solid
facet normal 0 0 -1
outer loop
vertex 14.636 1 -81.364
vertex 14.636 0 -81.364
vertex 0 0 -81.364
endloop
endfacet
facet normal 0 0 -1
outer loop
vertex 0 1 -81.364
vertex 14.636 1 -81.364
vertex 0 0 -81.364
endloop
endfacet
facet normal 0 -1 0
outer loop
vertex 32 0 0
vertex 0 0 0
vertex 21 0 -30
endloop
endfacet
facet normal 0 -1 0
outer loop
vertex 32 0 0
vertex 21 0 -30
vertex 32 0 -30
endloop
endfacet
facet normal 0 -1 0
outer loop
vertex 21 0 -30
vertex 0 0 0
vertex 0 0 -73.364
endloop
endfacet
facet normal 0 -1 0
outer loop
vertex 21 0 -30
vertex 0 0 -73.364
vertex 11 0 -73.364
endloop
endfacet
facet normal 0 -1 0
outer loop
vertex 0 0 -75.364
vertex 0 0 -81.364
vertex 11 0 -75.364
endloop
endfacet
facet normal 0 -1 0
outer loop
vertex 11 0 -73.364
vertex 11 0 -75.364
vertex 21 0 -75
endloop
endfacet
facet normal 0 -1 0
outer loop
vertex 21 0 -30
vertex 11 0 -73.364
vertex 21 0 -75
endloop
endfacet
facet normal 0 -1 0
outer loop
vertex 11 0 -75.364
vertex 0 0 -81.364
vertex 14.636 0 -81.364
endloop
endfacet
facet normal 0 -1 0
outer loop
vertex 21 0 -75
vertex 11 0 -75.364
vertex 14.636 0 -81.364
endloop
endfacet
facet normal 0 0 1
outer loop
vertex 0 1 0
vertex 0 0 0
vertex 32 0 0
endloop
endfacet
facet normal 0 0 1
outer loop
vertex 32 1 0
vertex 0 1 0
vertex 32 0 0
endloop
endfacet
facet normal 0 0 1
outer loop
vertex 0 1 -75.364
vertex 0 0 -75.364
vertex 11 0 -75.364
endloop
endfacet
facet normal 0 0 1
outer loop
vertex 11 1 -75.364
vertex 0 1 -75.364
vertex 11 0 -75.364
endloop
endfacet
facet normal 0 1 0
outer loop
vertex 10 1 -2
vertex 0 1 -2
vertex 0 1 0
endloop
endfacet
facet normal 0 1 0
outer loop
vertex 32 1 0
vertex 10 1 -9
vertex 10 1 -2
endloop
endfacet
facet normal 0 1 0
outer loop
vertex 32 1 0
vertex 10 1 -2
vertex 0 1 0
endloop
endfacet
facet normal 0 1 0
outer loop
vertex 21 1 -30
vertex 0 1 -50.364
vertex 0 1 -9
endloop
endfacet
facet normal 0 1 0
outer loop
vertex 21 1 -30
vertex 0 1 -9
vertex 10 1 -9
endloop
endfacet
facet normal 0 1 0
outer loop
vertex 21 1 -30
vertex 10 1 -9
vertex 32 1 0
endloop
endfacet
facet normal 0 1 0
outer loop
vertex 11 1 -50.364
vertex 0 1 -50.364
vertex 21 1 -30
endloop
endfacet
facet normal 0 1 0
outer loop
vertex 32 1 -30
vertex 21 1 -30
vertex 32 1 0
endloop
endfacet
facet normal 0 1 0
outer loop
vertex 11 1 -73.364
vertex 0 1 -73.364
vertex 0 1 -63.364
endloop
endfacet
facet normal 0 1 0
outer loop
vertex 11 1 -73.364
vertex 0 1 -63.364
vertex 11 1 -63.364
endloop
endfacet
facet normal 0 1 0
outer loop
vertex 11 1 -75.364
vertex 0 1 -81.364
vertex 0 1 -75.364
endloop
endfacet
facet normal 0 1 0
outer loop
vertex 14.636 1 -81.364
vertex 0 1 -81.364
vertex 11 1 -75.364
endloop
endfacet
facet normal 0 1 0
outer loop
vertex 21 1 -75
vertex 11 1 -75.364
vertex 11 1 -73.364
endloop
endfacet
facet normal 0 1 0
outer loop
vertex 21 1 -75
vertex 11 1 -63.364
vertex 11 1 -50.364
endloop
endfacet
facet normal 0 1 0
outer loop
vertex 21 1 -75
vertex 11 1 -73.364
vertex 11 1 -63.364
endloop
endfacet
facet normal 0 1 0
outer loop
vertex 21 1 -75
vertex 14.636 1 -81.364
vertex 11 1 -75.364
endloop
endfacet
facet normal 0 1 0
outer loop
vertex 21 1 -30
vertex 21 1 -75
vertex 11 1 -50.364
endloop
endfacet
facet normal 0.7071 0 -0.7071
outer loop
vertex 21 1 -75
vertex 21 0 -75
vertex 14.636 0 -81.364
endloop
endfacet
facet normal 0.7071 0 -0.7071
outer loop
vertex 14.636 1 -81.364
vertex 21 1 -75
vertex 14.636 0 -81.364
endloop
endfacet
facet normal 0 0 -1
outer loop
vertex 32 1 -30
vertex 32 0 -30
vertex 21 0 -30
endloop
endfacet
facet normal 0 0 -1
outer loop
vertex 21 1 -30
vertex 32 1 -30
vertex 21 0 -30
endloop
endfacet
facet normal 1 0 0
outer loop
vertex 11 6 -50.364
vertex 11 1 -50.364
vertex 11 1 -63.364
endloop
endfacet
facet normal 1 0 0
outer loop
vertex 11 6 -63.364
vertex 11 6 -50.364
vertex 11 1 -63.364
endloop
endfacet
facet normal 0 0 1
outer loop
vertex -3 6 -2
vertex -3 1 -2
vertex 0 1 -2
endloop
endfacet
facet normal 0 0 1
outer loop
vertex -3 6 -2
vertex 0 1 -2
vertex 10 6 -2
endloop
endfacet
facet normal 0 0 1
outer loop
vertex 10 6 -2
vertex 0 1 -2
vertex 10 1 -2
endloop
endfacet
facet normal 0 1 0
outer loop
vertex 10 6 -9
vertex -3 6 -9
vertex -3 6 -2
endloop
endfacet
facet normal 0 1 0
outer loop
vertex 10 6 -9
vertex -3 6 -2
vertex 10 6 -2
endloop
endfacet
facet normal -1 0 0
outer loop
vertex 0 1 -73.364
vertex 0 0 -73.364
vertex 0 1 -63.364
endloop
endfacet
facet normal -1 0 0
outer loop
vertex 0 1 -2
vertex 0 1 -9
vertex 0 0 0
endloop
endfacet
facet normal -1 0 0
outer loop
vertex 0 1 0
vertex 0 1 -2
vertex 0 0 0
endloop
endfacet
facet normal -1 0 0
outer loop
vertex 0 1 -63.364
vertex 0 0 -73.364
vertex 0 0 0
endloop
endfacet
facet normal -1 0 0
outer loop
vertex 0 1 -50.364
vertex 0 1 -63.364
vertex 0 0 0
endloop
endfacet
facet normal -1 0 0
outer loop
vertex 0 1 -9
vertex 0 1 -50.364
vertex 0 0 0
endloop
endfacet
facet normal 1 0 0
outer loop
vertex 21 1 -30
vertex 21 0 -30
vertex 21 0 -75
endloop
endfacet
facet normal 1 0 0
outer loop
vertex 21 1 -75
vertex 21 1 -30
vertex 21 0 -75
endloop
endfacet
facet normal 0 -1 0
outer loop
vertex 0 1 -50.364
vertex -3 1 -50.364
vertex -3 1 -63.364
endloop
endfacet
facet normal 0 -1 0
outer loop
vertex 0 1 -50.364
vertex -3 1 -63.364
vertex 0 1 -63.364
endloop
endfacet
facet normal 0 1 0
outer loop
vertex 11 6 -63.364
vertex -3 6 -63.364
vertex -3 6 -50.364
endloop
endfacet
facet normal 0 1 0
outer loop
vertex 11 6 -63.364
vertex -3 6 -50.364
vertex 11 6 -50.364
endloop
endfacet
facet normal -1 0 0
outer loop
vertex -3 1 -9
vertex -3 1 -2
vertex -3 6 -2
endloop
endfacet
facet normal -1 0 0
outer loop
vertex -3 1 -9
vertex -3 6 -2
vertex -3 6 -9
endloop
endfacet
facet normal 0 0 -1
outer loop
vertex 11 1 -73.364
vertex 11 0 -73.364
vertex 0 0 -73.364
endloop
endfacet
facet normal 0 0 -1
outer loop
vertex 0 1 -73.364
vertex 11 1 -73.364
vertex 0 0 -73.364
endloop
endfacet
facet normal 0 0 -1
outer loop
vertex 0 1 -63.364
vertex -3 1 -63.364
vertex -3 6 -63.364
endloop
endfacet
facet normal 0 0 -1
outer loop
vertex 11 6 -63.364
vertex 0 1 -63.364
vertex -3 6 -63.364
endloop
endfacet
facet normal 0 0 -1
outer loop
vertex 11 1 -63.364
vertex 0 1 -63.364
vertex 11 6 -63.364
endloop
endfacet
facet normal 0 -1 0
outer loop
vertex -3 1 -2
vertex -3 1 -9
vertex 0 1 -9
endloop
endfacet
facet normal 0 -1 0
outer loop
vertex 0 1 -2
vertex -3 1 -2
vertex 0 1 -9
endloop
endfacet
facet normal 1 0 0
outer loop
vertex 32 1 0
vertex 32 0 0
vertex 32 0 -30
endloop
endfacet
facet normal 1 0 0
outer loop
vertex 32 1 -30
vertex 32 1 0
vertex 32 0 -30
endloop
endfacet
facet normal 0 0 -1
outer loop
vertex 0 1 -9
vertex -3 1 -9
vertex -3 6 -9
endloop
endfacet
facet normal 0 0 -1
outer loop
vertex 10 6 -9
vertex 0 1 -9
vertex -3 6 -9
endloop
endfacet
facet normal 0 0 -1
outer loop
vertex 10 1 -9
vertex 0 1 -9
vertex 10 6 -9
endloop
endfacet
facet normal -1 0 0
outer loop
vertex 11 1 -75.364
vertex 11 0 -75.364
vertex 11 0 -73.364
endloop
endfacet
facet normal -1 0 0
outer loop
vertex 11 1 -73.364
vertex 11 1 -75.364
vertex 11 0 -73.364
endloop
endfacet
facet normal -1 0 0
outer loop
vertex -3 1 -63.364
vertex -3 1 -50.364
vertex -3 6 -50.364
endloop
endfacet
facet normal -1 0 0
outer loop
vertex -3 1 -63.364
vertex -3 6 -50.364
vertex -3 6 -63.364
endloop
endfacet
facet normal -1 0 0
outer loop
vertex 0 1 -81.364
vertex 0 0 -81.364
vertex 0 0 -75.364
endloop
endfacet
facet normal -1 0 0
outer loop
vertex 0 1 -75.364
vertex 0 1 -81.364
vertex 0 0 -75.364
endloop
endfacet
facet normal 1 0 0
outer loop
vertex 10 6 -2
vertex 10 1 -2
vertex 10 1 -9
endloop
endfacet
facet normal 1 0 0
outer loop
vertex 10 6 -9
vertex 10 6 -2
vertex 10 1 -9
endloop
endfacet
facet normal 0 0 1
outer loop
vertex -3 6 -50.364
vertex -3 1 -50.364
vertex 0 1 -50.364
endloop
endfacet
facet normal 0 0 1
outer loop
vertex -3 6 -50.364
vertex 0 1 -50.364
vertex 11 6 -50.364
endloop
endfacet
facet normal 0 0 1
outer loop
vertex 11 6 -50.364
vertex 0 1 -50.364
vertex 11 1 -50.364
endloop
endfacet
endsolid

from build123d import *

# Parameters (mm, degrees)
EXTRUDE_1_DEPTH = 1
SKETCH_2_W      = 13
SKETCH_2_H      = 7
EXTRUDE_2_DEPTH = 5
SKETCH_3_W      = 14
SKETCH_3_H      = 13
EXTRUDE_3_DEPTH = 5


with BuildPart() as part:
    # 草圖1 → 填料-伸長1 (new body)
    with BuildSketch(Plane(origin=(0, 0, 0), x_dir=(1, 0, 0), z_dir=(0, 1, 0))):
        Polygon((0, 0), (32, 0), (32, 30), (21, 30), (21, 75), (14.636038969, 81.363961031), (0, 81.363961031), (0, 75.363961031), (11, 75.363961031), (11, 73.363961031), (0, 73.363961031), align=None)
    extrude(amount=EXTRUDE_1_DEPTH)

    # 草圖2 → 填料-伸長2 (add)
    with BuildSketch(Plane(origin=(0, 1, 0), x_dir=(1, 0, 0), z_dir=(0, 1, 0))):
        with Locations((3.5, 5.5)):
            Rectangle(SKETCH_2_W, SKETCH_2_H)
    extrude(amount=EXTRUDE_2_DEPTH)

    # 草圖3 → 填料-伸長3 (add)
    with BuildSketch(Plane(origin=(0, 1, 0), x_dir=(1, 0, 0), z_dir=(0, 1, 0))):
        with Locations((4, 56.863961031)):
            Rectangle(SKETCH_3_W, SKETCH_3_H)
    extrude(amount=EXTRUDE_3_DEPTH)


solid = part.part
